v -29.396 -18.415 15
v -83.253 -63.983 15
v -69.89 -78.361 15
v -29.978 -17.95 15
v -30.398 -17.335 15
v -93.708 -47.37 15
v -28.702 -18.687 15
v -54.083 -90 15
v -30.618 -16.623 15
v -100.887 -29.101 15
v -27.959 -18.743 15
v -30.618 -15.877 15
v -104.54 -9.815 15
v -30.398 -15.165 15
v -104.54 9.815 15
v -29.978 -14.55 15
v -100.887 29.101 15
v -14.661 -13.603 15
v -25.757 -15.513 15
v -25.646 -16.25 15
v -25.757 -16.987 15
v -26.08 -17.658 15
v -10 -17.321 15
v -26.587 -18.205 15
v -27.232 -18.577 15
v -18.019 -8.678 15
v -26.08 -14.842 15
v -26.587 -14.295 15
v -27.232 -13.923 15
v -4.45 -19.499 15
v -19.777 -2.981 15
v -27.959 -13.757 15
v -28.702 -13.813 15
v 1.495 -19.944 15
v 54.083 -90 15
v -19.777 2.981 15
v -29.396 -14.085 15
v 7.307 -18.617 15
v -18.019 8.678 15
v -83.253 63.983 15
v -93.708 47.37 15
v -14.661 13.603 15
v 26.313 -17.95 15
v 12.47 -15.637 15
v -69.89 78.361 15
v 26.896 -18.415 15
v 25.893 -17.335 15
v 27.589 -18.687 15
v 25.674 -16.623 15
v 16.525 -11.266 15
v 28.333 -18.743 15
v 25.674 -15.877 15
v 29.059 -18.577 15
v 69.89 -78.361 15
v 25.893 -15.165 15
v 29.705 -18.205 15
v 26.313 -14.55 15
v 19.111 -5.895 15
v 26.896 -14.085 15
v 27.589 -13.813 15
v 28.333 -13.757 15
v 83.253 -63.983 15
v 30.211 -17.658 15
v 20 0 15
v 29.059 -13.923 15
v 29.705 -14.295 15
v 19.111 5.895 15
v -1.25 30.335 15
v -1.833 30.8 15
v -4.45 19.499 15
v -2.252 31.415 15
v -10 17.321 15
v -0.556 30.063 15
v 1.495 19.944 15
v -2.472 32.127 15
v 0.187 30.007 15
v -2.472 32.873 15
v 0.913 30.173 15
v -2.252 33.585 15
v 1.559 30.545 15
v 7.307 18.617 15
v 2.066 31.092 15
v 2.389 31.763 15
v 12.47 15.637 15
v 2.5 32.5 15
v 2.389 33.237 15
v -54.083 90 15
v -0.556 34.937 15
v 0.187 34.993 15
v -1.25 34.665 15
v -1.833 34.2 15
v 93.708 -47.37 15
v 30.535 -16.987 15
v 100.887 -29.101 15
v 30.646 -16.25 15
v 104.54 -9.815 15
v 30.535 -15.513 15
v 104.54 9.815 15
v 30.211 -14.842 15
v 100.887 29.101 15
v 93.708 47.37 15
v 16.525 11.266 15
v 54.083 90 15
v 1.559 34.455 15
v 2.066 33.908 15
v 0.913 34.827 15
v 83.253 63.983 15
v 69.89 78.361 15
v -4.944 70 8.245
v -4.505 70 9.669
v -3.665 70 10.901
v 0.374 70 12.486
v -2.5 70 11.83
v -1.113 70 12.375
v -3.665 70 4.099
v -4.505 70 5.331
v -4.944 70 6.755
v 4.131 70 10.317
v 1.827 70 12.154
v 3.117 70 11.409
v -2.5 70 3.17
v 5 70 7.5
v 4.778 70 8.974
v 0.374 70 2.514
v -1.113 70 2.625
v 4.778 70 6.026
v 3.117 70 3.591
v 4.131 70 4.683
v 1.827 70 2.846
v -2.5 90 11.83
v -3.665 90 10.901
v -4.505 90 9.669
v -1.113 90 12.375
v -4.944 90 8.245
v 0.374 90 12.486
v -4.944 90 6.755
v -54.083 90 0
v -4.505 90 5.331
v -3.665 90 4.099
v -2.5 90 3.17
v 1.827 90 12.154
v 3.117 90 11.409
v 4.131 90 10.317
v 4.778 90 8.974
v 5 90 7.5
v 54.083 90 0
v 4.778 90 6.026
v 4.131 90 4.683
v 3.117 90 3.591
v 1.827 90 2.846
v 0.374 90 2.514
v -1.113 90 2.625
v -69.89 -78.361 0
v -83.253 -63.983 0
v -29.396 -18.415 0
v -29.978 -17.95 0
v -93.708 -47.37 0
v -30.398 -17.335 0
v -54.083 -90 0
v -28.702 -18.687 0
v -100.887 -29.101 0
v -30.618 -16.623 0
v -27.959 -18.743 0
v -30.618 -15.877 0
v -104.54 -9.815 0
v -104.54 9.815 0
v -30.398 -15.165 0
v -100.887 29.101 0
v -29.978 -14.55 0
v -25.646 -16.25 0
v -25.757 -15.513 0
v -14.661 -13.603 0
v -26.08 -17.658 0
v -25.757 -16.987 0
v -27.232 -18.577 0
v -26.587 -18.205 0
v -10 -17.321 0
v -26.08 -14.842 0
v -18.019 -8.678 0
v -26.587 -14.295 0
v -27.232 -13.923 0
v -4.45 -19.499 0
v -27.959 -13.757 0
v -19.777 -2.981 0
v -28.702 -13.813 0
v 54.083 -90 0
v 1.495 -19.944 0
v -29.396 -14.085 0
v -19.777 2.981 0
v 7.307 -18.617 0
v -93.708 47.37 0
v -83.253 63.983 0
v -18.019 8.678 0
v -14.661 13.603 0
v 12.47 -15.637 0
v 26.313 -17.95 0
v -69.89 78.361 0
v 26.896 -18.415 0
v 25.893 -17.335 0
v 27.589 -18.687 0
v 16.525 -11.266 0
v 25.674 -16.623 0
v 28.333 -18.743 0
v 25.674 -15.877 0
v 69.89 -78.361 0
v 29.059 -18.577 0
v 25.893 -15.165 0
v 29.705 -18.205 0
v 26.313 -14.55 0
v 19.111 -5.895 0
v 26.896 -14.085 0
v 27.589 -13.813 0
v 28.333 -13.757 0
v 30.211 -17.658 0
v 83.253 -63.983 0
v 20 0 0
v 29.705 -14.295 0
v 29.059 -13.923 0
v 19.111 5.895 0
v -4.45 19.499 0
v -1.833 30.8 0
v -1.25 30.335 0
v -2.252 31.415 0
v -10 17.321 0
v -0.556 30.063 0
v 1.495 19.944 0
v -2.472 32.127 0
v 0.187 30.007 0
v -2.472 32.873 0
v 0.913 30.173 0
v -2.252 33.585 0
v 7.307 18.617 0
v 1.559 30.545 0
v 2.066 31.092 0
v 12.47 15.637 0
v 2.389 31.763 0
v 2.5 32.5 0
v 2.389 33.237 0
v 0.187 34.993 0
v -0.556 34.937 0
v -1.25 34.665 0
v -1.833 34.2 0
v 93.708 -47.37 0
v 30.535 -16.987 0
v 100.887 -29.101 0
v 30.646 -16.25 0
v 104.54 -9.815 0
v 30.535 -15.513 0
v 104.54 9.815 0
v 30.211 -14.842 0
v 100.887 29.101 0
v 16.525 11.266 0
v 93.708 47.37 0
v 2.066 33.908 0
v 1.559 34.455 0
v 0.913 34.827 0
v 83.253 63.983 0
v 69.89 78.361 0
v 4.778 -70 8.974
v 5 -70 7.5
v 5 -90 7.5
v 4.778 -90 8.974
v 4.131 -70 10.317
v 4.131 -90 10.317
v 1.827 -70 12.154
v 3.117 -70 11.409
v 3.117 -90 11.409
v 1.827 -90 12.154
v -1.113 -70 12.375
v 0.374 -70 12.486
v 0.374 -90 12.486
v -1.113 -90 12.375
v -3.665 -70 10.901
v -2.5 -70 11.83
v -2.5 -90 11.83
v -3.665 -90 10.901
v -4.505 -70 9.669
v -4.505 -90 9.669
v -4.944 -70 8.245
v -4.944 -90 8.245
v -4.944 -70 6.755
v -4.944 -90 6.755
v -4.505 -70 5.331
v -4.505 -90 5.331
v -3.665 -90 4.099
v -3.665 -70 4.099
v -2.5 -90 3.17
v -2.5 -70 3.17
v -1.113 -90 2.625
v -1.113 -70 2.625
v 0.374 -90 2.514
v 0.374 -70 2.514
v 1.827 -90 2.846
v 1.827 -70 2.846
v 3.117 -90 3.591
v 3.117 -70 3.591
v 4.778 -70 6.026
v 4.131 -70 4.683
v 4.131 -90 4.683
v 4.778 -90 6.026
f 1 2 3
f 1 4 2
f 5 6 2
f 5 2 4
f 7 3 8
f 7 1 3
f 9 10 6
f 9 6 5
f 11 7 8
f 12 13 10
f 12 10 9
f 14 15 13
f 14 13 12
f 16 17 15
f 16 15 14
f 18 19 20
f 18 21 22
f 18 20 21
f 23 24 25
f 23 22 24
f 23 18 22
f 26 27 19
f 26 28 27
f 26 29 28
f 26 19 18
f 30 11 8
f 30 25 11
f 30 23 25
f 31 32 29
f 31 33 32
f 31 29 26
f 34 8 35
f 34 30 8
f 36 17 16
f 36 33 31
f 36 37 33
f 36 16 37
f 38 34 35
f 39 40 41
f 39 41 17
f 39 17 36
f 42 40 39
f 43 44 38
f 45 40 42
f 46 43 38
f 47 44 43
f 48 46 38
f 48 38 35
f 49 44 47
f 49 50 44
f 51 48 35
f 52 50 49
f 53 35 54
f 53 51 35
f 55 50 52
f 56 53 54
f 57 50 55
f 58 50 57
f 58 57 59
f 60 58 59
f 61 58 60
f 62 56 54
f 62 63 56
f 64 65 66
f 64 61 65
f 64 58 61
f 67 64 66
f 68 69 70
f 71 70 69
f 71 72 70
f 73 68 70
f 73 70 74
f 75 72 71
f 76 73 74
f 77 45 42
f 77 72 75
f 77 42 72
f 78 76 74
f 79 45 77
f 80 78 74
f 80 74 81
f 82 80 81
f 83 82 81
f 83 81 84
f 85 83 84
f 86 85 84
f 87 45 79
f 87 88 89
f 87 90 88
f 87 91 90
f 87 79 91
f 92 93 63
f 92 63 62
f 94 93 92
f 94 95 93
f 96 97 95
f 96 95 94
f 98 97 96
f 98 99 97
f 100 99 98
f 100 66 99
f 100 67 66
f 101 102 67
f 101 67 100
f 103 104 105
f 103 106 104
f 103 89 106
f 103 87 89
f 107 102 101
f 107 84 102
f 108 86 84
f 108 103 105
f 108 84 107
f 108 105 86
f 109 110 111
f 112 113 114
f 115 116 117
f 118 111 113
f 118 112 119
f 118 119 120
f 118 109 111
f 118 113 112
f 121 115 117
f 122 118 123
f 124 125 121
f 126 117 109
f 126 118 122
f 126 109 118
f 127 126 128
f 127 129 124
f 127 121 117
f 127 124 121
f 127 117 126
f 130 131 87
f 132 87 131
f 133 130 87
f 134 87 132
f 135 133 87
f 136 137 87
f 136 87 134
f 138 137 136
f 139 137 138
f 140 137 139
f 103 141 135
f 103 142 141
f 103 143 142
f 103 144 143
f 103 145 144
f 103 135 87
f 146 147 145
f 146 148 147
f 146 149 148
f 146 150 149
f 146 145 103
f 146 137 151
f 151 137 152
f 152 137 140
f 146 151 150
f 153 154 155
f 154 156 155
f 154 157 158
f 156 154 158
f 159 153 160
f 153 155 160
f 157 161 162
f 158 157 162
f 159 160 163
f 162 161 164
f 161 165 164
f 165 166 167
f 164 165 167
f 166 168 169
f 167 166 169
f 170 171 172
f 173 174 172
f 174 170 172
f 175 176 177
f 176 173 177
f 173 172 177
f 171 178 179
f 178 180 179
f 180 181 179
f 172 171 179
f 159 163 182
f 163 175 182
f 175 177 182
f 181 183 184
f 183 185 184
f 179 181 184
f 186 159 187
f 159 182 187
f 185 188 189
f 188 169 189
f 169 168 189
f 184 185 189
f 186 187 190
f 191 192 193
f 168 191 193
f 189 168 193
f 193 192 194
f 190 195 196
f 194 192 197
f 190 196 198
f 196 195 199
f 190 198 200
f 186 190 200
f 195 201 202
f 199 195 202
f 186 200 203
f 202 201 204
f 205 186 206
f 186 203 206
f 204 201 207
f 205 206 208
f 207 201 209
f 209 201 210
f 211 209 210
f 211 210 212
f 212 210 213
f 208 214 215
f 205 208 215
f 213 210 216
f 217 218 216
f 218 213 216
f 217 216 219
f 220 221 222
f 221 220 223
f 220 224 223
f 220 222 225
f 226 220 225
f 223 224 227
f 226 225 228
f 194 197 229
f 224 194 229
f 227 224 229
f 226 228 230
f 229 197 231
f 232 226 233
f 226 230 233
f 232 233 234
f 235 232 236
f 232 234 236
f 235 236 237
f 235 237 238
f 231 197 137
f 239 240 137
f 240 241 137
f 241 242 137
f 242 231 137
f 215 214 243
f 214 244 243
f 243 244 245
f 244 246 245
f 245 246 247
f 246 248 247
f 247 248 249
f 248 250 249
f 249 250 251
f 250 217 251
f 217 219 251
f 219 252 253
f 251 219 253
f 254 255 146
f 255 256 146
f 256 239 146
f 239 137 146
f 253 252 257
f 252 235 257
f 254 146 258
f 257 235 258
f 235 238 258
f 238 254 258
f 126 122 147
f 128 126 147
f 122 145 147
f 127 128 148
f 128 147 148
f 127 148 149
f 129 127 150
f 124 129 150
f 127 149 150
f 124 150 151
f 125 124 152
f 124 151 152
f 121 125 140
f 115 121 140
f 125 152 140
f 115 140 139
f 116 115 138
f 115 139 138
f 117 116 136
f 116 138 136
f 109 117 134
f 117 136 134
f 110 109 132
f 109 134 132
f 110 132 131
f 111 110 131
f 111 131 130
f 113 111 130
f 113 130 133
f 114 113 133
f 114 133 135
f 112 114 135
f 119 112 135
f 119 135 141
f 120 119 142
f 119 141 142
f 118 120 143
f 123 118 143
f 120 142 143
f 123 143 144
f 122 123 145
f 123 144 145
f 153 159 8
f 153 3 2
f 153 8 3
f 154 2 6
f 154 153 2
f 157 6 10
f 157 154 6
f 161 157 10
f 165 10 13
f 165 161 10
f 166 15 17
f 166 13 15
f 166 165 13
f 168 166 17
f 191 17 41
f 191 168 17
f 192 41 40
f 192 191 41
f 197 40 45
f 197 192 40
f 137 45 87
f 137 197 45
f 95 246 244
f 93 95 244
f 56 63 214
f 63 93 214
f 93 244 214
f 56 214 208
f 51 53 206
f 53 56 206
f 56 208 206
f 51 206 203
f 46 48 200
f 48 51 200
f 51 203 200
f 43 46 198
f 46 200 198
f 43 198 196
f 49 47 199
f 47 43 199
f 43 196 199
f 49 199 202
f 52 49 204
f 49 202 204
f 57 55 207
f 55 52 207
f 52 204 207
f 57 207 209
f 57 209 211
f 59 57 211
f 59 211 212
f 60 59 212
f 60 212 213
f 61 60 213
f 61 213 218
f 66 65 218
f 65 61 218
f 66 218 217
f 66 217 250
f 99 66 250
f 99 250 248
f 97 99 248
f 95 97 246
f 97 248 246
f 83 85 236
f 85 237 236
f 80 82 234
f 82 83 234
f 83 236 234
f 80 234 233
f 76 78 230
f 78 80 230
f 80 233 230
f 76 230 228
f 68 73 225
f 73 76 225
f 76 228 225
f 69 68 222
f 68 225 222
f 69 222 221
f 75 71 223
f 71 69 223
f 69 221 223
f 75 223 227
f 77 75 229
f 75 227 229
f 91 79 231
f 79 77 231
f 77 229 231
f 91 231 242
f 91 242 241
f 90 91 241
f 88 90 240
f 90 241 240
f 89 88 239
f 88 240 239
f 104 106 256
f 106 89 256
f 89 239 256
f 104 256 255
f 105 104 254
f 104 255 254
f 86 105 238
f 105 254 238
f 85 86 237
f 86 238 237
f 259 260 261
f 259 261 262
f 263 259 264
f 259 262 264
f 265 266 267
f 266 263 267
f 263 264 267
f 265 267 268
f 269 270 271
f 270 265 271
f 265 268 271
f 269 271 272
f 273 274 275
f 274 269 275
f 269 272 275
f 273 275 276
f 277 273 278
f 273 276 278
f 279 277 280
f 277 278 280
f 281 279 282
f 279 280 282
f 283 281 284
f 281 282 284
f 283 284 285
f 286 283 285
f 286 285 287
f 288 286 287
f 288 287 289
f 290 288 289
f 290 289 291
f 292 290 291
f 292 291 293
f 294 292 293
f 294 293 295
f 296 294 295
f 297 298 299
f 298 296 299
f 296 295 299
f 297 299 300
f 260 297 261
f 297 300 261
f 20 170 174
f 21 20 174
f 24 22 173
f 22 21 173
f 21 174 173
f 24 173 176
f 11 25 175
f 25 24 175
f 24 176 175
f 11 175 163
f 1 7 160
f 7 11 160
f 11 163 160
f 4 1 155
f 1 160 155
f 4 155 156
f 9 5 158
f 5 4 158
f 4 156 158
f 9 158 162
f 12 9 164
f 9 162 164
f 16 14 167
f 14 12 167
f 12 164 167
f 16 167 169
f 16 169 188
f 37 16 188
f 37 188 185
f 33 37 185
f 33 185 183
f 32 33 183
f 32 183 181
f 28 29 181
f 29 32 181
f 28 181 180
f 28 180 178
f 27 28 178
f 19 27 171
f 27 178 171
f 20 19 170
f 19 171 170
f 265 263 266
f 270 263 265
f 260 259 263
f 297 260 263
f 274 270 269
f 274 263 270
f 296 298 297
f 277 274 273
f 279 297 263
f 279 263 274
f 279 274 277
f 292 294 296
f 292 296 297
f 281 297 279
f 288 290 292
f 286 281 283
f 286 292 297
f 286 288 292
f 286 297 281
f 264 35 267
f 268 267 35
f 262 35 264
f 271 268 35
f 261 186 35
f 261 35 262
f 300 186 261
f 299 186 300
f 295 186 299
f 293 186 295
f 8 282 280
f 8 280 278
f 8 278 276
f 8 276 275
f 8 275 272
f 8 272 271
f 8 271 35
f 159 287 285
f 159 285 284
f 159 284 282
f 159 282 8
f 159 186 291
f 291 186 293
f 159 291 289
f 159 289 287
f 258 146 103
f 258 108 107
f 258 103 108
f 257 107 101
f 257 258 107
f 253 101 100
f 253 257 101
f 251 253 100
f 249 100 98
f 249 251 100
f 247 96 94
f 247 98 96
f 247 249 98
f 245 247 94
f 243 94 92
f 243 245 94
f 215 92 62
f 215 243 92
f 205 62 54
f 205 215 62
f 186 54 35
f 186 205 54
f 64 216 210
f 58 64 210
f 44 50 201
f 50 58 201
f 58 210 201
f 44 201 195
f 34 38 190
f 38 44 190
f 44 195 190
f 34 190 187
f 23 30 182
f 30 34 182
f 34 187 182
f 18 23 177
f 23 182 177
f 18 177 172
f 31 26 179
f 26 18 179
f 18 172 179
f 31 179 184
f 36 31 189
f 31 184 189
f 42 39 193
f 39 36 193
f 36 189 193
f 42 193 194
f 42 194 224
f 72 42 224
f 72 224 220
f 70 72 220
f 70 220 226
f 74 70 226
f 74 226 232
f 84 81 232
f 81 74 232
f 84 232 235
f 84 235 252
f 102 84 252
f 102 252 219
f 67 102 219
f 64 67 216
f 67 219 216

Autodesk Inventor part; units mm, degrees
ref_plane "YZ Plane" through (0, 0, 0) normal (1, 0, 0) x (0, 1, 0)
ref_plane "XZ Plane" through (0, 0, 0) normal (0, 1, 0) x (-1, 0, 0)
sketch "Boceto1" plane through (0, 0, 0) normal (0, 0, 1) x (1, 0, 0)
  circle A0 centre (0, 0) radius 20
  line L0 (0, 0) -> (0, 37.5) construction
  line L1 (0, 0) -> (-32.476, -18.75) construction
  line L2 (0, 0) -> (32.476, -18.75) construction
  circle A1 centre (0, 0) radius 27.5 construction
  circle A2 centre (0, 32.5) radius 2.5
  circle A3 centre (-28.1458, -16.25) radius 2.5
  circle A4 centre (28.1458, -16.25) radius 2.5
  line L3 (0, 37.5) -> (0, 105) construction
  line L4 (-54.0833, 90) -> (54.0833, 90)
  line L5 (54.0833, -90) -> (-54.0833, -90)
  arc A5 (-54.0833, 90) -> (-54.0833, -90) centre (0, 0) ccw
  arc A6 (54.0833, -90) -> (54.0833, 90) centre (0, 0) ccw
  point P0 (0, 27.5)
  dimension "d2" = 55
  dimension "d1" = 40
  dimension "d3" = 10
  dimension "d4" = 120
  dimension "d5" = 120
  dimension "d6" = 120
  dimension "d7" = 5
  dimension "d8" = 5
  dimension "d11" = 360
  dimension "d13" = 90
  dimension "d16" = 360
  dimension "d18" = 105
extrude "Extrusión1" add sketch "Boceto1" along normal blind 15
sketch "Boceto2" plane through (-54.0833, 90, 0) normal (0, 1, 0) x (1, 0, 0)
  line L0 (54.0833, 0) -> (54.0833, -15) construction
  line L1 (108.1665, -15) -> (0, -15) construction
  line L2 (0, 0) -> (0, -15) construction
  line L3 (0, -7.5) -> (108.1665, -7.5) construction
  line L4 (108.1665, 0) -> (108.1665, -15) construction
  circle A0 centre (54.0833, -7.5) radius 5
  dimension "d21" = 10
extrude "Extrusión2" cut sketch "Boceto2" against normal blind 20
ref_plane "Plano de trabajo1" through (-105, 0, 15) normal (0, 1, 0) x (1, 0, 0)
mirror "Simetría1" about plane through (-105, 0, 15) normal (0, 1, 0) of "Extrusión2"
properties part number "Tapa cvt"
